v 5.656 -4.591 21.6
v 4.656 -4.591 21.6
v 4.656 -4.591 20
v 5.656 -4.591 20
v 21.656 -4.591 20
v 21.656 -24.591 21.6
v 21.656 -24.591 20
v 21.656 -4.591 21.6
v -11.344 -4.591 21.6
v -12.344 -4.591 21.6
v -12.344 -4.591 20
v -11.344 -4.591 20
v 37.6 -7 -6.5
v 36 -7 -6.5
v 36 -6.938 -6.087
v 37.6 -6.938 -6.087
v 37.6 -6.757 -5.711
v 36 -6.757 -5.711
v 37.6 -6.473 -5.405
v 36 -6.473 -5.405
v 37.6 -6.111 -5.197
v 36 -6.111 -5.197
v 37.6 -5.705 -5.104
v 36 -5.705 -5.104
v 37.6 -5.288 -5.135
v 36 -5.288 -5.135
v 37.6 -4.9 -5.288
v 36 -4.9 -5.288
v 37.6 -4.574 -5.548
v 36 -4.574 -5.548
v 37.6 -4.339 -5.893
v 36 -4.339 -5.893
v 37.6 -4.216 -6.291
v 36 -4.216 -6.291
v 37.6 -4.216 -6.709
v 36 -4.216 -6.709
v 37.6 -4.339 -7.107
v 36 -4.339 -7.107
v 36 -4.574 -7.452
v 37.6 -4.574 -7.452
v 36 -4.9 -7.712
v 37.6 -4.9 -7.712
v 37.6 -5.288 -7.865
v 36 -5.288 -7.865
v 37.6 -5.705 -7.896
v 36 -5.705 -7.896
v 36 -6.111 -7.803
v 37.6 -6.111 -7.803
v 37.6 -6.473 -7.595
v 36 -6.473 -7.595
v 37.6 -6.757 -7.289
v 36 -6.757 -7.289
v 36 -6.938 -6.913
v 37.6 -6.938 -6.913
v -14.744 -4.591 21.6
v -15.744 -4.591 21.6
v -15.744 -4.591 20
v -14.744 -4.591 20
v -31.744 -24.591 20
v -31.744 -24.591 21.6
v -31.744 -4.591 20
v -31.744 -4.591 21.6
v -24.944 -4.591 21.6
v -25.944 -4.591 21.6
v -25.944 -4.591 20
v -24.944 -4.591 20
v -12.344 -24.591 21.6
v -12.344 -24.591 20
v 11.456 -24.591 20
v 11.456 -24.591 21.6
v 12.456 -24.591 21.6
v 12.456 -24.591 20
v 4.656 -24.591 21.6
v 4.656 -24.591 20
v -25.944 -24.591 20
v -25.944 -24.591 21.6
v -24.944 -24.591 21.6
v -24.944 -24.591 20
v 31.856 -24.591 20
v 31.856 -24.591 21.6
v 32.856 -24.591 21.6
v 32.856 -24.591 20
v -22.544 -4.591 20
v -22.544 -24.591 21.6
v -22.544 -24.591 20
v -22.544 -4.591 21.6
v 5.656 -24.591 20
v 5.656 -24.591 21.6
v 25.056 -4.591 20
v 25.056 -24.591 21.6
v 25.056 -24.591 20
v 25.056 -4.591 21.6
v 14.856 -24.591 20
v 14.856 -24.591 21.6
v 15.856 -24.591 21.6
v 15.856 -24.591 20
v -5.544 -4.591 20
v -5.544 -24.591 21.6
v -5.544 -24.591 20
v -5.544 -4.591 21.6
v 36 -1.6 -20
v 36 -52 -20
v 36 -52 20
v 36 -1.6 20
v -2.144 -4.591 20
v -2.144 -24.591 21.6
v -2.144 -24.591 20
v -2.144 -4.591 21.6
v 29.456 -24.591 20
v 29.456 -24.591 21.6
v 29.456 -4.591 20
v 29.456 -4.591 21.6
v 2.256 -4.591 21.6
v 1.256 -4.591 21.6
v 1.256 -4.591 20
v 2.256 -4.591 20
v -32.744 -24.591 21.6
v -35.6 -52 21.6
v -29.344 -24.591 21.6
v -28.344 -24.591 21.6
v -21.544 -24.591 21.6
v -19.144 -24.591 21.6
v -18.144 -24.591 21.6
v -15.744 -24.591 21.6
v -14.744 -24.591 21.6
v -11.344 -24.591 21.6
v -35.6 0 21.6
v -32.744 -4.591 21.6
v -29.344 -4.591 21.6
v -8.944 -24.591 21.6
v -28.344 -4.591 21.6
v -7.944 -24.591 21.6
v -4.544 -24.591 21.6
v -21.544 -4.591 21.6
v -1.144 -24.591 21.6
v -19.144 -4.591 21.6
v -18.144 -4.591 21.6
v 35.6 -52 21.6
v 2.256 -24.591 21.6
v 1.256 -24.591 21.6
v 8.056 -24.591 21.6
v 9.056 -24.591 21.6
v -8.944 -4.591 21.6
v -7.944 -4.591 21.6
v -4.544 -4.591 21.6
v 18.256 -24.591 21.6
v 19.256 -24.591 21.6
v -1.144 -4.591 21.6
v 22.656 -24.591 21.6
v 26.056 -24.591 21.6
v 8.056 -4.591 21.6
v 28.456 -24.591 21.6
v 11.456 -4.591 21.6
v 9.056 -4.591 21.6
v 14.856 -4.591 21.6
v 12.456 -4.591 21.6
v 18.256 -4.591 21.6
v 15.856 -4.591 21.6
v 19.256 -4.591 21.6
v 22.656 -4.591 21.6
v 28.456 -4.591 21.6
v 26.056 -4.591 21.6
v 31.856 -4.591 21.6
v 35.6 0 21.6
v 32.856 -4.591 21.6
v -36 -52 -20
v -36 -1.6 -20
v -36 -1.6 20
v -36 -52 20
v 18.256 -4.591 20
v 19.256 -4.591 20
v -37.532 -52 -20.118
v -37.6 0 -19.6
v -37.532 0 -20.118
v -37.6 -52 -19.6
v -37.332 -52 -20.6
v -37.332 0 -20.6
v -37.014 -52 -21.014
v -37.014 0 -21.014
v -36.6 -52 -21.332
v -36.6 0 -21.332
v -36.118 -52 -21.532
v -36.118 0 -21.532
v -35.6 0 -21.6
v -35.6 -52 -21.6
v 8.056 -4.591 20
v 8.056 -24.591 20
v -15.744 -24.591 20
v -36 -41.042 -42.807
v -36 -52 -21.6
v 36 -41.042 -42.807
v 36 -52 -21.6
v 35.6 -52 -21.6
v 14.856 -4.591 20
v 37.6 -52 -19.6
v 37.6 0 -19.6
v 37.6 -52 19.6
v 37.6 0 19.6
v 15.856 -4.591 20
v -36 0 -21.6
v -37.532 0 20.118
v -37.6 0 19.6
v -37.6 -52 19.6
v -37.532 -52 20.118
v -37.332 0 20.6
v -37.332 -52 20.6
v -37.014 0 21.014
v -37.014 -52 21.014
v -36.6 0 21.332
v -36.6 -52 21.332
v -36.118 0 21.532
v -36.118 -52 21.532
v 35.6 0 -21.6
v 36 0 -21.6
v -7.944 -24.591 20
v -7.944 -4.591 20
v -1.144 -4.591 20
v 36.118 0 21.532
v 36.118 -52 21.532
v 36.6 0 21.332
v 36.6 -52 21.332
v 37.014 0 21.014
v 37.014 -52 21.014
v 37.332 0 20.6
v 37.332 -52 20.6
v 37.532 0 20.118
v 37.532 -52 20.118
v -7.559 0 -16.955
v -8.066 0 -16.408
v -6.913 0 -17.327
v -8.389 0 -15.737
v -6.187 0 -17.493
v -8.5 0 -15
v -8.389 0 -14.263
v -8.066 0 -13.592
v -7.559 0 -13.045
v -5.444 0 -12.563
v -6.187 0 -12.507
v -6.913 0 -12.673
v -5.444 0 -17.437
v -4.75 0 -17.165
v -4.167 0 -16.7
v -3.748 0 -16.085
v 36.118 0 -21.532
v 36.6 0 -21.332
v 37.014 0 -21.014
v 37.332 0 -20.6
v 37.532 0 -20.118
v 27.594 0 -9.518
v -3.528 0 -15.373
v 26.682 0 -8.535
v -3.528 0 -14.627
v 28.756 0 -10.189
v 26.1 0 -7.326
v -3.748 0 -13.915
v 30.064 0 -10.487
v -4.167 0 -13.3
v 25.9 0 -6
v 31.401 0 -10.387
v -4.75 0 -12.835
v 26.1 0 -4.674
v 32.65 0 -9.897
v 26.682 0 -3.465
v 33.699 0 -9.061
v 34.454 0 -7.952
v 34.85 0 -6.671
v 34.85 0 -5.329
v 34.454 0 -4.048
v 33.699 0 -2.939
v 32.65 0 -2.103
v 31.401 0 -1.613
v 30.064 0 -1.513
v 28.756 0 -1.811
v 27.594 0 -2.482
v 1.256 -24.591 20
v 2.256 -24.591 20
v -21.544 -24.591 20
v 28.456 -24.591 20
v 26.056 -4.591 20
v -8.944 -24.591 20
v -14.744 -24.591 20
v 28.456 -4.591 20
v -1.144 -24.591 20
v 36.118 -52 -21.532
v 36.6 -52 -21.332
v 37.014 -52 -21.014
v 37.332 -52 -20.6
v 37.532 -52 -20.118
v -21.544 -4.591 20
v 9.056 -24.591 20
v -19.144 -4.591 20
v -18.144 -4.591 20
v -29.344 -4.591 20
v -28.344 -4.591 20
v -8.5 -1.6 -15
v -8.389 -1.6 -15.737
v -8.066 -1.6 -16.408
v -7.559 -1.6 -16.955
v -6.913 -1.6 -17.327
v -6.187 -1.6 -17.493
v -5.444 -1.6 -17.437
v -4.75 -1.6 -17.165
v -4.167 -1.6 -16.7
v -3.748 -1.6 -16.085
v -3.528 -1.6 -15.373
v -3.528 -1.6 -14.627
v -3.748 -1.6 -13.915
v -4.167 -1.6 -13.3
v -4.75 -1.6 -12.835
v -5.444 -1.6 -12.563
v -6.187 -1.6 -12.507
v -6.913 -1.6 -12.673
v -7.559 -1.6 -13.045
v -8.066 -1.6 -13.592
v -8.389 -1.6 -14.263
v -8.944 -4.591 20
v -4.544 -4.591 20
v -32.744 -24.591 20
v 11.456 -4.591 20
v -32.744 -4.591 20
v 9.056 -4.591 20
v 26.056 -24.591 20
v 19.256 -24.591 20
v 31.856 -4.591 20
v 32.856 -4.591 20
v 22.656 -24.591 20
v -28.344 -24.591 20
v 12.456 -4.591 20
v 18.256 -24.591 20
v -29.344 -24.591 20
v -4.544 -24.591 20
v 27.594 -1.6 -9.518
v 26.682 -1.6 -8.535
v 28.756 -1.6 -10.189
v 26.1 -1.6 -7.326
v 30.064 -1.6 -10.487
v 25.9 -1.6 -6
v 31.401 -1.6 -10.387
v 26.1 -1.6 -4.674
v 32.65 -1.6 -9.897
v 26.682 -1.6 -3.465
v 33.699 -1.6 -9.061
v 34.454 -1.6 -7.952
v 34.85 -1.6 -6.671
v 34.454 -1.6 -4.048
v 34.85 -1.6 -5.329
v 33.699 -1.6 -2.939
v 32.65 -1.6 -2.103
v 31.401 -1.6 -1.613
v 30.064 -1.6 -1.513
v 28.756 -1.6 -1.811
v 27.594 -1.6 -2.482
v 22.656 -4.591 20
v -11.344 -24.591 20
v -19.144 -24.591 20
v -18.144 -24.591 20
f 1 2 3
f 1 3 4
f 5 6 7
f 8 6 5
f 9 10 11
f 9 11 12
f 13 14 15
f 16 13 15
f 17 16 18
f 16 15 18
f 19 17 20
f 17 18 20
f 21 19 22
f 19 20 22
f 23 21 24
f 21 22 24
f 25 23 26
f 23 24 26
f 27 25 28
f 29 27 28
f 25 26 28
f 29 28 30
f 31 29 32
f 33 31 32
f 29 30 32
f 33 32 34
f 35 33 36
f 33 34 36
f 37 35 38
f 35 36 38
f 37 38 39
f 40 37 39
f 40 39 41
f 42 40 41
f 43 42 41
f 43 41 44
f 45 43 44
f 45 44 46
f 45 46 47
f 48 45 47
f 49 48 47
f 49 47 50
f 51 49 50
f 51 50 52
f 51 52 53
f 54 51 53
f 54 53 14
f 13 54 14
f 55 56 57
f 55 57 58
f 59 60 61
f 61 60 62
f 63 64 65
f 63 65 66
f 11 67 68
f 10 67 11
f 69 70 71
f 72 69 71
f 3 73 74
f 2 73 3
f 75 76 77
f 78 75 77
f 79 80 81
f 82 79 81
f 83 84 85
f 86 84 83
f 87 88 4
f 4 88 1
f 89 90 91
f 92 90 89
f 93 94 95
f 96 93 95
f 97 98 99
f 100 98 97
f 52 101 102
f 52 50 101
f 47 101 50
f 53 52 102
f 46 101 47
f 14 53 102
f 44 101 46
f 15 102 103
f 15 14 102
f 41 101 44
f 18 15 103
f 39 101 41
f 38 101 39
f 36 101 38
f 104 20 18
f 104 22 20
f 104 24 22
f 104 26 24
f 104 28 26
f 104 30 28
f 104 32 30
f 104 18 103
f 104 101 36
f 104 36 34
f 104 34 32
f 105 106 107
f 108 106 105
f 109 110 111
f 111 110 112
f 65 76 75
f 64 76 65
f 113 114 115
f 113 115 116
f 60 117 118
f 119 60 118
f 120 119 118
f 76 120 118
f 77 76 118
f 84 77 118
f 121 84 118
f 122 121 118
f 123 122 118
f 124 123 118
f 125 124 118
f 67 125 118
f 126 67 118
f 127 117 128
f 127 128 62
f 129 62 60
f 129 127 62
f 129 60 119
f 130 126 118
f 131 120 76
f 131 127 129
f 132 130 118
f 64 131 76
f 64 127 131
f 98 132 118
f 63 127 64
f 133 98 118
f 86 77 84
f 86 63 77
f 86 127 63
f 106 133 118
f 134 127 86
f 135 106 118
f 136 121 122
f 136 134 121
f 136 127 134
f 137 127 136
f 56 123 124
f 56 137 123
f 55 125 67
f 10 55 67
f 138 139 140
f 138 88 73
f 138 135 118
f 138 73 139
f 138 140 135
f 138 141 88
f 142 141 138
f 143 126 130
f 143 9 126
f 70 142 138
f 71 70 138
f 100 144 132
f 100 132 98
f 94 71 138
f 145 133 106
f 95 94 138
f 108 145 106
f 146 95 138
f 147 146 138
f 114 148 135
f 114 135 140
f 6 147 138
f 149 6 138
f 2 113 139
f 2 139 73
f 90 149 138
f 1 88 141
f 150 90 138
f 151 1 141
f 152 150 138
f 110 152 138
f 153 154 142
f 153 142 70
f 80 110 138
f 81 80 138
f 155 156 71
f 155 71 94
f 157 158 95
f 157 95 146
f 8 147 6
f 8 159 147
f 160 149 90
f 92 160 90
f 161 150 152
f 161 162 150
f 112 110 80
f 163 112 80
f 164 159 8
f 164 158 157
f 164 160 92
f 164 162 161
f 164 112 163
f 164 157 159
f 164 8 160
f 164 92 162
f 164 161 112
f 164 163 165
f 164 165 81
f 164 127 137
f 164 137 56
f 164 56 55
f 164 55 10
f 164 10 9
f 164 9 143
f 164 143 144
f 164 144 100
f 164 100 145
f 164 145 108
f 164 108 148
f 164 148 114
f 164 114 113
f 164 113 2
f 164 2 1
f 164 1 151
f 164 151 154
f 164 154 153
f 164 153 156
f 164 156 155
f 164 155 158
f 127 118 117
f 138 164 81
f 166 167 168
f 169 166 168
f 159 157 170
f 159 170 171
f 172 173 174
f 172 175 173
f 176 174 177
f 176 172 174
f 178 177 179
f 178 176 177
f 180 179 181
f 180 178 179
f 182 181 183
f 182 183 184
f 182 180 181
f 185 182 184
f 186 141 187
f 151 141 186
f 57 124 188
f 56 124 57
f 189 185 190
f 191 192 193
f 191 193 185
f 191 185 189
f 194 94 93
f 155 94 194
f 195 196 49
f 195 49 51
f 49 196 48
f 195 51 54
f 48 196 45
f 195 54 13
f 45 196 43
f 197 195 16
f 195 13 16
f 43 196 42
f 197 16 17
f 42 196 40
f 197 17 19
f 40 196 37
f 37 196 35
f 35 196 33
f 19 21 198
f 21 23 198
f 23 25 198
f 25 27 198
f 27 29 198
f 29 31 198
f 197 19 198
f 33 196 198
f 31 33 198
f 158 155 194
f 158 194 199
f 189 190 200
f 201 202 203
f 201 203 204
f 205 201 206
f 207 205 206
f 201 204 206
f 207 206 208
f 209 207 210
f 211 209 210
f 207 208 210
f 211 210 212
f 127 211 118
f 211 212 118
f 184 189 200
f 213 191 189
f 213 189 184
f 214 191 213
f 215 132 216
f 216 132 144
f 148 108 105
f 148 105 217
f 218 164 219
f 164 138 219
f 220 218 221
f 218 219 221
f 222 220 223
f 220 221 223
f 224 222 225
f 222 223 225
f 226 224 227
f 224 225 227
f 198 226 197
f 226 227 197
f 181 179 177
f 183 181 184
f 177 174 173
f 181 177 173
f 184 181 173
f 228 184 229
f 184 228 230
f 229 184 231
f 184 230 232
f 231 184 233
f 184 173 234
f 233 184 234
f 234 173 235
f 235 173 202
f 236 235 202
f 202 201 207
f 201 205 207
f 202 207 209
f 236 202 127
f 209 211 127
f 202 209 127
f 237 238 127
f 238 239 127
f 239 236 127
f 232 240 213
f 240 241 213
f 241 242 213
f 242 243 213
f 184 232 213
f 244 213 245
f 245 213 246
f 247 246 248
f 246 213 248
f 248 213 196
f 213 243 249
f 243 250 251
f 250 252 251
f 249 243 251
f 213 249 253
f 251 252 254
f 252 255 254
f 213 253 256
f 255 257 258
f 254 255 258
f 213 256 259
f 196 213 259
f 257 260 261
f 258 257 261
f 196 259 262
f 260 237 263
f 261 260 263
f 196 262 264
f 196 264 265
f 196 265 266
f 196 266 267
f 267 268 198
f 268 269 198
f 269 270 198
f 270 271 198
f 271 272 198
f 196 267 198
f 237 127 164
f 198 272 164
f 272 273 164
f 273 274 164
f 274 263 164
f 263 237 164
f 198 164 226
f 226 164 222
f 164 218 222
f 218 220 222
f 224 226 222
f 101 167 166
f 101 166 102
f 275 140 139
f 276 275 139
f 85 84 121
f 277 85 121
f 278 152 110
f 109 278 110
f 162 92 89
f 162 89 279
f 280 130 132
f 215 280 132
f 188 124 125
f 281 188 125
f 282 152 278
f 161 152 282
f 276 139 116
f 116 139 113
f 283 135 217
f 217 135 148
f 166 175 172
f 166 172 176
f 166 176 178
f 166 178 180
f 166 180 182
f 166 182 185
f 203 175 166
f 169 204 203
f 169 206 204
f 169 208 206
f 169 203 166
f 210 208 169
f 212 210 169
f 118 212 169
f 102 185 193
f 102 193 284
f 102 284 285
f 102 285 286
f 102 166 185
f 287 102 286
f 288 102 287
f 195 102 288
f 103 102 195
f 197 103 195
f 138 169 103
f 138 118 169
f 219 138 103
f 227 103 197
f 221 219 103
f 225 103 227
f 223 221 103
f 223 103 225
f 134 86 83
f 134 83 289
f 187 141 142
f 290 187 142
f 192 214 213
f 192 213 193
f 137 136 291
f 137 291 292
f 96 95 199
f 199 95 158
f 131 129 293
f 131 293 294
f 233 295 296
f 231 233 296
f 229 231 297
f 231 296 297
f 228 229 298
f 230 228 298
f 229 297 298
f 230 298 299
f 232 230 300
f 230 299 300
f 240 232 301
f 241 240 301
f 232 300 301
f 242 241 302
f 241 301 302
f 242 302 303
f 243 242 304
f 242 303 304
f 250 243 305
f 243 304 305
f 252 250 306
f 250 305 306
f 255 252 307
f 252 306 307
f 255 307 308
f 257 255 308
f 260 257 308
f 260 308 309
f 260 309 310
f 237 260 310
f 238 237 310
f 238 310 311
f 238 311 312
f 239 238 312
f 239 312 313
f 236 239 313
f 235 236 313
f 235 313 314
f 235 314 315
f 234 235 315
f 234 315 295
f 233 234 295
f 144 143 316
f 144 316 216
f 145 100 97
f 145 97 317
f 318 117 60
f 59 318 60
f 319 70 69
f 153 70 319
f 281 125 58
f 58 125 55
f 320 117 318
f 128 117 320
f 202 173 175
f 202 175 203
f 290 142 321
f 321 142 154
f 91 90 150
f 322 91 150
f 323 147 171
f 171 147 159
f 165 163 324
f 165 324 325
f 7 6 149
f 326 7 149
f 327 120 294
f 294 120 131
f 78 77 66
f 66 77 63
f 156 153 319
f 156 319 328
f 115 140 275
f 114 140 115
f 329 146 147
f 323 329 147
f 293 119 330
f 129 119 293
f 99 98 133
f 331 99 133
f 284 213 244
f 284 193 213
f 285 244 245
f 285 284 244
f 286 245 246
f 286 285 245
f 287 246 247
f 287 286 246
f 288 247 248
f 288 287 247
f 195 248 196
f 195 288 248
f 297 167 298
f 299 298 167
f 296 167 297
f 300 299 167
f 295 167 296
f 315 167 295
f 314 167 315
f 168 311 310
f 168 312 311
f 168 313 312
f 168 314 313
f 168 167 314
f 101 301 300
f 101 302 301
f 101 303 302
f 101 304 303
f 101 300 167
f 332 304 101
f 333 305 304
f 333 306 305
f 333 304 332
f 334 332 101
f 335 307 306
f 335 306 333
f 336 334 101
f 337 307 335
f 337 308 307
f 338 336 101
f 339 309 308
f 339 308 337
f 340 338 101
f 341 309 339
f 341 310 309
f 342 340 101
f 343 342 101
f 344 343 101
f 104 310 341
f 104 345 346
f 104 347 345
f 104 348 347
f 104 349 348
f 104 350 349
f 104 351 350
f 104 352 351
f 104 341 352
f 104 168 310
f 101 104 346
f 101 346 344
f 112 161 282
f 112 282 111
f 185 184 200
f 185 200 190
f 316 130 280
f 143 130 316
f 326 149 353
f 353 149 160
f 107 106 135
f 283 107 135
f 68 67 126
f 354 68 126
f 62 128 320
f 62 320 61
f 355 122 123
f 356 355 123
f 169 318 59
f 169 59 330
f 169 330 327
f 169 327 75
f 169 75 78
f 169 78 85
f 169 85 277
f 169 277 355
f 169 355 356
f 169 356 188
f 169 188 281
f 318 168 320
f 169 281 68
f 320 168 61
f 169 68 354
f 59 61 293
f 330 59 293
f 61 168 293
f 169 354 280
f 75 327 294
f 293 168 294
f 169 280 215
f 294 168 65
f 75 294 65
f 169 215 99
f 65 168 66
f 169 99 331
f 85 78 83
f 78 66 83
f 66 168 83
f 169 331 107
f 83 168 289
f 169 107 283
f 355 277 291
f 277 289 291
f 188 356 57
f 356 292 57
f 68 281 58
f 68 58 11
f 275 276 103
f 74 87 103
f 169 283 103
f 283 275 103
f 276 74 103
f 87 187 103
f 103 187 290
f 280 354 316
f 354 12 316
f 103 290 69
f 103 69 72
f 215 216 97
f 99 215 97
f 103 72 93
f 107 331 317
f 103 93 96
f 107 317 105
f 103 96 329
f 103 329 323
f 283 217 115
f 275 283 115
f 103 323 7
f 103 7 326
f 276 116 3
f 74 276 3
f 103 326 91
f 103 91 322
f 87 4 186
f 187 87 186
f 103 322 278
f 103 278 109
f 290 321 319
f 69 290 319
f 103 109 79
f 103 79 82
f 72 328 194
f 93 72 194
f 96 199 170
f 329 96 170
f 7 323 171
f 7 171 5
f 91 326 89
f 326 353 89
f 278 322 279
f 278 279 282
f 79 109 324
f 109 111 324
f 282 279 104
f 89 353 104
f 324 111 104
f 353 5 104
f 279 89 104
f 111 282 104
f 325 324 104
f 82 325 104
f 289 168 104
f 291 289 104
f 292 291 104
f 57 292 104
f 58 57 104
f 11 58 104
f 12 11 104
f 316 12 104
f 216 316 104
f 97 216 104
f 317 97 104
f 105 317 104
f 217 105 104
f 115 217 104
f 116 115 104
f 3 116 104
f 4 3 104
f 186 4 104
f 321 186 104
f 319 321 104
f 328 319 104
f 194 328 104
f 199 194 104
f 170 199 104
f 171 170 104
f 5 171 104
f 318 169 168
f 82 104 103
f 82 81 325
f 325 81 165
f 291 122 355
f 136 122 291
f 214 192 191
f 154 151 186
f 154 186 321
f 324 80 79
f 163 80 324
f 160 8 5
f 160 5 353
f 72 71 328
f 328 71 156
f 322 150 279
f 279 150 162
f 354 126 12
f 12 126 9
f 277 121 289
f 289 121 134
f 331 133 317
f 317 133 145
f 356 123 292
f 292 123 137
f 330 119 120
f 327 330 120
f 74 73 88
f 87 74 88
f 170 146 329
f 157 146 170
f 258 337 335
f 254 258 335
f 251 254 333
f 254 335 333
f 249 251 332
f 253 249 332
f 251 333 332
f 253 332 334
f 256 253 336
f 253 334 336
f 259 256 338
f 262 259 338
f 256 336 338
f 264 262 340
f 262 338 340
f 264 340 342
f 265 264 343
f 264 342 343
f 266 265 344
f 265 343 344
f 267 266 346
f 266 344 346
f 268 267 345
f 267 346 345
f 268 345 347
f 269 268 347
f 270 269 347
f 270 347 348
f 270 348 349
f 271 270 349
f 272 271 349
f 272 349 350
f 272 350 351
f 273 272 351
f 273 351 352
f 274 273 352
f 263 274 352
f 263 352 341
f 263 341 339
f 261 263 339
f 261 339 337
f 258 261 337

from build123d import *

# Parameters (mm, degrees)
F0_W      = 75.2
F0_H      = 43.2
F0_W_2    = 72
F0_H_2    = 40
F1_DEPTH  = 52
F2_R      = 2
F3_DEPTH  = 1.6
F5_DEPTH  = 36
F6_D      = 9
F8_D      = 2.8
F8_DEPTH  = 1.601
F9_D      = 5
F10_W     = 1
F10_H     = 20
F11_DEPTH = 25


with BuildPart() as f1:
    # F0 (on Front) → F1 (new body)
    with BuildSketch(Plane.XZ):
        Rectangle(F0_W, F0_H)
        Rectangle(F0_W_2, F0_H_2, mode=Mode.SUBTRACT)
    extrude(amount=F1_DEPTH)

    # F2
    f2_edges = [f1.edges().sort_by_distance(p)[0] for p in [
        (37.6, -26, 21.6),
        (-37.6, -26, 21.6),
        (-37.6, -26, -21.6),
        (37.6, -26, -21.6),
    ]]
    fillet(f2_edges, radius=F2_R)

    # F0 (on Front) → F3 (join)
    with BuildSketch(Plane.XZ):
        Rectangle(F0_W_2, F0_H_2)
    extrude(amount=F3_DEPTH)

    # F4 (on Right) → F5 (join, symmetric)
    with BuildSketch(Plane.YZ):
        Polygon((0, -21.6), (-52, -21.6), (-41.0421315348, -42.8069394041), align=None)
    extrude(amount=F5_DEPTH, both=True)

    # F6 (through all)
    with Locations(Plane(origin=(0, 0, 0), x_dir=(1, 0, 0), z_dir=(0, 1, 0))):
        with Locations((30.4, 6)):
            Hole(F6_D / 2)

    # F8 (through all, one way)
    with BuildSketch(Plane(origin=(36, 0, 0), x_dir=(0, -1, 0), z_dir=(-1, 0, 0))):
        with Locations((5.6, -6.5)):
            Circle(F8_D / 2)
    extrude(amount=-F8_DEPTH, mode=Mode.SUBTRACT)

    # F9 (through all)
    with Locations(Plane(origin=(0, 0, 0), x_dir=(1, 0, 0), z_dir=(0, 1, 0))):
        with Locations((-6, 15)):
            Hole(F9_D / 2)

    # F10 (on face) → F11 (cut)
    with BuildSketch(Plane.XY.offset(21.6)):
        with Locations((-32.2436588705, -14.5910207555)):
            Rectangle(F10_W, F10_H)
        with Locations((-28.8436588705, -14.5910207555)):
            Rectangle(F10_W, F10_H)
        with Locations((-25.4436588705, -14.5910207555)):
            Rectangle(F10_W, F10_H)
        with Locations((-22.0436588705, -14.5910207555)):
            Rectangle(F10_W, F10_H)
        with Locations((-18.6436588705, -14.5910207555)):
            Rectangle(F10_W, F10_H)
        with Locations((-15.2436588705, -14.5910207555)):
            Rectangle(F10_W, F10_H)
        with Locations((-11.8436588705, -14.5910207555)):
            Rectangle(F10_W, F10_H)
        with Locations((-8.4436588705, -14.5910207555)):
            Rectangle(F10_W, F10_H)
        with Locations((-5.0436588705, -14.5910207555)):
            Rectangle(F10_W, F10_H)
        with Locations((1.7563411295, -14.5910207555)):
            Rectangle(F10_W, F10_H)
        with Locations((5.1563411295, -14.5910207555)):
            Rectangle(F10_W, F10_H)
        with Locations((-1.6436588705, -14.5910207555)):
            Rectangle(F10_W, F10_H)
        with Locations((8.5563411295, -14.5910207555)):
            Rectangle(F10_W, F10_H)
        with Locations((11.9563411295, -14.5910207555)):
            Rectangle(F10_W, F10_H)
        with Locations((15.3563411295, -14.5910207555)):
            Rectangle(F10_W, F10_H)
        with Locations((18.7563411295, -14.5910207555)):
            Rectangle(F10_W, F10_H)
        with Locations((22.1563411295, -14.5910207555)):
            Rectangle(F10_W, F10_H)
        with Locations((25.5563411295, -14.5910207555)):
            Rectangle(F10_W, F10_H)
        with Locations((28.9563411295, -14.5910207555)):
            Rectangle(F10_W, F10_H)
        with Locations((32.3563411295, -14.5910207555)):
            Rectangle(F10_W, F10_H)
    extrude(amount=-F11_DEPTH, mode=Mode.SUBTRACT)


solid = f1.part
